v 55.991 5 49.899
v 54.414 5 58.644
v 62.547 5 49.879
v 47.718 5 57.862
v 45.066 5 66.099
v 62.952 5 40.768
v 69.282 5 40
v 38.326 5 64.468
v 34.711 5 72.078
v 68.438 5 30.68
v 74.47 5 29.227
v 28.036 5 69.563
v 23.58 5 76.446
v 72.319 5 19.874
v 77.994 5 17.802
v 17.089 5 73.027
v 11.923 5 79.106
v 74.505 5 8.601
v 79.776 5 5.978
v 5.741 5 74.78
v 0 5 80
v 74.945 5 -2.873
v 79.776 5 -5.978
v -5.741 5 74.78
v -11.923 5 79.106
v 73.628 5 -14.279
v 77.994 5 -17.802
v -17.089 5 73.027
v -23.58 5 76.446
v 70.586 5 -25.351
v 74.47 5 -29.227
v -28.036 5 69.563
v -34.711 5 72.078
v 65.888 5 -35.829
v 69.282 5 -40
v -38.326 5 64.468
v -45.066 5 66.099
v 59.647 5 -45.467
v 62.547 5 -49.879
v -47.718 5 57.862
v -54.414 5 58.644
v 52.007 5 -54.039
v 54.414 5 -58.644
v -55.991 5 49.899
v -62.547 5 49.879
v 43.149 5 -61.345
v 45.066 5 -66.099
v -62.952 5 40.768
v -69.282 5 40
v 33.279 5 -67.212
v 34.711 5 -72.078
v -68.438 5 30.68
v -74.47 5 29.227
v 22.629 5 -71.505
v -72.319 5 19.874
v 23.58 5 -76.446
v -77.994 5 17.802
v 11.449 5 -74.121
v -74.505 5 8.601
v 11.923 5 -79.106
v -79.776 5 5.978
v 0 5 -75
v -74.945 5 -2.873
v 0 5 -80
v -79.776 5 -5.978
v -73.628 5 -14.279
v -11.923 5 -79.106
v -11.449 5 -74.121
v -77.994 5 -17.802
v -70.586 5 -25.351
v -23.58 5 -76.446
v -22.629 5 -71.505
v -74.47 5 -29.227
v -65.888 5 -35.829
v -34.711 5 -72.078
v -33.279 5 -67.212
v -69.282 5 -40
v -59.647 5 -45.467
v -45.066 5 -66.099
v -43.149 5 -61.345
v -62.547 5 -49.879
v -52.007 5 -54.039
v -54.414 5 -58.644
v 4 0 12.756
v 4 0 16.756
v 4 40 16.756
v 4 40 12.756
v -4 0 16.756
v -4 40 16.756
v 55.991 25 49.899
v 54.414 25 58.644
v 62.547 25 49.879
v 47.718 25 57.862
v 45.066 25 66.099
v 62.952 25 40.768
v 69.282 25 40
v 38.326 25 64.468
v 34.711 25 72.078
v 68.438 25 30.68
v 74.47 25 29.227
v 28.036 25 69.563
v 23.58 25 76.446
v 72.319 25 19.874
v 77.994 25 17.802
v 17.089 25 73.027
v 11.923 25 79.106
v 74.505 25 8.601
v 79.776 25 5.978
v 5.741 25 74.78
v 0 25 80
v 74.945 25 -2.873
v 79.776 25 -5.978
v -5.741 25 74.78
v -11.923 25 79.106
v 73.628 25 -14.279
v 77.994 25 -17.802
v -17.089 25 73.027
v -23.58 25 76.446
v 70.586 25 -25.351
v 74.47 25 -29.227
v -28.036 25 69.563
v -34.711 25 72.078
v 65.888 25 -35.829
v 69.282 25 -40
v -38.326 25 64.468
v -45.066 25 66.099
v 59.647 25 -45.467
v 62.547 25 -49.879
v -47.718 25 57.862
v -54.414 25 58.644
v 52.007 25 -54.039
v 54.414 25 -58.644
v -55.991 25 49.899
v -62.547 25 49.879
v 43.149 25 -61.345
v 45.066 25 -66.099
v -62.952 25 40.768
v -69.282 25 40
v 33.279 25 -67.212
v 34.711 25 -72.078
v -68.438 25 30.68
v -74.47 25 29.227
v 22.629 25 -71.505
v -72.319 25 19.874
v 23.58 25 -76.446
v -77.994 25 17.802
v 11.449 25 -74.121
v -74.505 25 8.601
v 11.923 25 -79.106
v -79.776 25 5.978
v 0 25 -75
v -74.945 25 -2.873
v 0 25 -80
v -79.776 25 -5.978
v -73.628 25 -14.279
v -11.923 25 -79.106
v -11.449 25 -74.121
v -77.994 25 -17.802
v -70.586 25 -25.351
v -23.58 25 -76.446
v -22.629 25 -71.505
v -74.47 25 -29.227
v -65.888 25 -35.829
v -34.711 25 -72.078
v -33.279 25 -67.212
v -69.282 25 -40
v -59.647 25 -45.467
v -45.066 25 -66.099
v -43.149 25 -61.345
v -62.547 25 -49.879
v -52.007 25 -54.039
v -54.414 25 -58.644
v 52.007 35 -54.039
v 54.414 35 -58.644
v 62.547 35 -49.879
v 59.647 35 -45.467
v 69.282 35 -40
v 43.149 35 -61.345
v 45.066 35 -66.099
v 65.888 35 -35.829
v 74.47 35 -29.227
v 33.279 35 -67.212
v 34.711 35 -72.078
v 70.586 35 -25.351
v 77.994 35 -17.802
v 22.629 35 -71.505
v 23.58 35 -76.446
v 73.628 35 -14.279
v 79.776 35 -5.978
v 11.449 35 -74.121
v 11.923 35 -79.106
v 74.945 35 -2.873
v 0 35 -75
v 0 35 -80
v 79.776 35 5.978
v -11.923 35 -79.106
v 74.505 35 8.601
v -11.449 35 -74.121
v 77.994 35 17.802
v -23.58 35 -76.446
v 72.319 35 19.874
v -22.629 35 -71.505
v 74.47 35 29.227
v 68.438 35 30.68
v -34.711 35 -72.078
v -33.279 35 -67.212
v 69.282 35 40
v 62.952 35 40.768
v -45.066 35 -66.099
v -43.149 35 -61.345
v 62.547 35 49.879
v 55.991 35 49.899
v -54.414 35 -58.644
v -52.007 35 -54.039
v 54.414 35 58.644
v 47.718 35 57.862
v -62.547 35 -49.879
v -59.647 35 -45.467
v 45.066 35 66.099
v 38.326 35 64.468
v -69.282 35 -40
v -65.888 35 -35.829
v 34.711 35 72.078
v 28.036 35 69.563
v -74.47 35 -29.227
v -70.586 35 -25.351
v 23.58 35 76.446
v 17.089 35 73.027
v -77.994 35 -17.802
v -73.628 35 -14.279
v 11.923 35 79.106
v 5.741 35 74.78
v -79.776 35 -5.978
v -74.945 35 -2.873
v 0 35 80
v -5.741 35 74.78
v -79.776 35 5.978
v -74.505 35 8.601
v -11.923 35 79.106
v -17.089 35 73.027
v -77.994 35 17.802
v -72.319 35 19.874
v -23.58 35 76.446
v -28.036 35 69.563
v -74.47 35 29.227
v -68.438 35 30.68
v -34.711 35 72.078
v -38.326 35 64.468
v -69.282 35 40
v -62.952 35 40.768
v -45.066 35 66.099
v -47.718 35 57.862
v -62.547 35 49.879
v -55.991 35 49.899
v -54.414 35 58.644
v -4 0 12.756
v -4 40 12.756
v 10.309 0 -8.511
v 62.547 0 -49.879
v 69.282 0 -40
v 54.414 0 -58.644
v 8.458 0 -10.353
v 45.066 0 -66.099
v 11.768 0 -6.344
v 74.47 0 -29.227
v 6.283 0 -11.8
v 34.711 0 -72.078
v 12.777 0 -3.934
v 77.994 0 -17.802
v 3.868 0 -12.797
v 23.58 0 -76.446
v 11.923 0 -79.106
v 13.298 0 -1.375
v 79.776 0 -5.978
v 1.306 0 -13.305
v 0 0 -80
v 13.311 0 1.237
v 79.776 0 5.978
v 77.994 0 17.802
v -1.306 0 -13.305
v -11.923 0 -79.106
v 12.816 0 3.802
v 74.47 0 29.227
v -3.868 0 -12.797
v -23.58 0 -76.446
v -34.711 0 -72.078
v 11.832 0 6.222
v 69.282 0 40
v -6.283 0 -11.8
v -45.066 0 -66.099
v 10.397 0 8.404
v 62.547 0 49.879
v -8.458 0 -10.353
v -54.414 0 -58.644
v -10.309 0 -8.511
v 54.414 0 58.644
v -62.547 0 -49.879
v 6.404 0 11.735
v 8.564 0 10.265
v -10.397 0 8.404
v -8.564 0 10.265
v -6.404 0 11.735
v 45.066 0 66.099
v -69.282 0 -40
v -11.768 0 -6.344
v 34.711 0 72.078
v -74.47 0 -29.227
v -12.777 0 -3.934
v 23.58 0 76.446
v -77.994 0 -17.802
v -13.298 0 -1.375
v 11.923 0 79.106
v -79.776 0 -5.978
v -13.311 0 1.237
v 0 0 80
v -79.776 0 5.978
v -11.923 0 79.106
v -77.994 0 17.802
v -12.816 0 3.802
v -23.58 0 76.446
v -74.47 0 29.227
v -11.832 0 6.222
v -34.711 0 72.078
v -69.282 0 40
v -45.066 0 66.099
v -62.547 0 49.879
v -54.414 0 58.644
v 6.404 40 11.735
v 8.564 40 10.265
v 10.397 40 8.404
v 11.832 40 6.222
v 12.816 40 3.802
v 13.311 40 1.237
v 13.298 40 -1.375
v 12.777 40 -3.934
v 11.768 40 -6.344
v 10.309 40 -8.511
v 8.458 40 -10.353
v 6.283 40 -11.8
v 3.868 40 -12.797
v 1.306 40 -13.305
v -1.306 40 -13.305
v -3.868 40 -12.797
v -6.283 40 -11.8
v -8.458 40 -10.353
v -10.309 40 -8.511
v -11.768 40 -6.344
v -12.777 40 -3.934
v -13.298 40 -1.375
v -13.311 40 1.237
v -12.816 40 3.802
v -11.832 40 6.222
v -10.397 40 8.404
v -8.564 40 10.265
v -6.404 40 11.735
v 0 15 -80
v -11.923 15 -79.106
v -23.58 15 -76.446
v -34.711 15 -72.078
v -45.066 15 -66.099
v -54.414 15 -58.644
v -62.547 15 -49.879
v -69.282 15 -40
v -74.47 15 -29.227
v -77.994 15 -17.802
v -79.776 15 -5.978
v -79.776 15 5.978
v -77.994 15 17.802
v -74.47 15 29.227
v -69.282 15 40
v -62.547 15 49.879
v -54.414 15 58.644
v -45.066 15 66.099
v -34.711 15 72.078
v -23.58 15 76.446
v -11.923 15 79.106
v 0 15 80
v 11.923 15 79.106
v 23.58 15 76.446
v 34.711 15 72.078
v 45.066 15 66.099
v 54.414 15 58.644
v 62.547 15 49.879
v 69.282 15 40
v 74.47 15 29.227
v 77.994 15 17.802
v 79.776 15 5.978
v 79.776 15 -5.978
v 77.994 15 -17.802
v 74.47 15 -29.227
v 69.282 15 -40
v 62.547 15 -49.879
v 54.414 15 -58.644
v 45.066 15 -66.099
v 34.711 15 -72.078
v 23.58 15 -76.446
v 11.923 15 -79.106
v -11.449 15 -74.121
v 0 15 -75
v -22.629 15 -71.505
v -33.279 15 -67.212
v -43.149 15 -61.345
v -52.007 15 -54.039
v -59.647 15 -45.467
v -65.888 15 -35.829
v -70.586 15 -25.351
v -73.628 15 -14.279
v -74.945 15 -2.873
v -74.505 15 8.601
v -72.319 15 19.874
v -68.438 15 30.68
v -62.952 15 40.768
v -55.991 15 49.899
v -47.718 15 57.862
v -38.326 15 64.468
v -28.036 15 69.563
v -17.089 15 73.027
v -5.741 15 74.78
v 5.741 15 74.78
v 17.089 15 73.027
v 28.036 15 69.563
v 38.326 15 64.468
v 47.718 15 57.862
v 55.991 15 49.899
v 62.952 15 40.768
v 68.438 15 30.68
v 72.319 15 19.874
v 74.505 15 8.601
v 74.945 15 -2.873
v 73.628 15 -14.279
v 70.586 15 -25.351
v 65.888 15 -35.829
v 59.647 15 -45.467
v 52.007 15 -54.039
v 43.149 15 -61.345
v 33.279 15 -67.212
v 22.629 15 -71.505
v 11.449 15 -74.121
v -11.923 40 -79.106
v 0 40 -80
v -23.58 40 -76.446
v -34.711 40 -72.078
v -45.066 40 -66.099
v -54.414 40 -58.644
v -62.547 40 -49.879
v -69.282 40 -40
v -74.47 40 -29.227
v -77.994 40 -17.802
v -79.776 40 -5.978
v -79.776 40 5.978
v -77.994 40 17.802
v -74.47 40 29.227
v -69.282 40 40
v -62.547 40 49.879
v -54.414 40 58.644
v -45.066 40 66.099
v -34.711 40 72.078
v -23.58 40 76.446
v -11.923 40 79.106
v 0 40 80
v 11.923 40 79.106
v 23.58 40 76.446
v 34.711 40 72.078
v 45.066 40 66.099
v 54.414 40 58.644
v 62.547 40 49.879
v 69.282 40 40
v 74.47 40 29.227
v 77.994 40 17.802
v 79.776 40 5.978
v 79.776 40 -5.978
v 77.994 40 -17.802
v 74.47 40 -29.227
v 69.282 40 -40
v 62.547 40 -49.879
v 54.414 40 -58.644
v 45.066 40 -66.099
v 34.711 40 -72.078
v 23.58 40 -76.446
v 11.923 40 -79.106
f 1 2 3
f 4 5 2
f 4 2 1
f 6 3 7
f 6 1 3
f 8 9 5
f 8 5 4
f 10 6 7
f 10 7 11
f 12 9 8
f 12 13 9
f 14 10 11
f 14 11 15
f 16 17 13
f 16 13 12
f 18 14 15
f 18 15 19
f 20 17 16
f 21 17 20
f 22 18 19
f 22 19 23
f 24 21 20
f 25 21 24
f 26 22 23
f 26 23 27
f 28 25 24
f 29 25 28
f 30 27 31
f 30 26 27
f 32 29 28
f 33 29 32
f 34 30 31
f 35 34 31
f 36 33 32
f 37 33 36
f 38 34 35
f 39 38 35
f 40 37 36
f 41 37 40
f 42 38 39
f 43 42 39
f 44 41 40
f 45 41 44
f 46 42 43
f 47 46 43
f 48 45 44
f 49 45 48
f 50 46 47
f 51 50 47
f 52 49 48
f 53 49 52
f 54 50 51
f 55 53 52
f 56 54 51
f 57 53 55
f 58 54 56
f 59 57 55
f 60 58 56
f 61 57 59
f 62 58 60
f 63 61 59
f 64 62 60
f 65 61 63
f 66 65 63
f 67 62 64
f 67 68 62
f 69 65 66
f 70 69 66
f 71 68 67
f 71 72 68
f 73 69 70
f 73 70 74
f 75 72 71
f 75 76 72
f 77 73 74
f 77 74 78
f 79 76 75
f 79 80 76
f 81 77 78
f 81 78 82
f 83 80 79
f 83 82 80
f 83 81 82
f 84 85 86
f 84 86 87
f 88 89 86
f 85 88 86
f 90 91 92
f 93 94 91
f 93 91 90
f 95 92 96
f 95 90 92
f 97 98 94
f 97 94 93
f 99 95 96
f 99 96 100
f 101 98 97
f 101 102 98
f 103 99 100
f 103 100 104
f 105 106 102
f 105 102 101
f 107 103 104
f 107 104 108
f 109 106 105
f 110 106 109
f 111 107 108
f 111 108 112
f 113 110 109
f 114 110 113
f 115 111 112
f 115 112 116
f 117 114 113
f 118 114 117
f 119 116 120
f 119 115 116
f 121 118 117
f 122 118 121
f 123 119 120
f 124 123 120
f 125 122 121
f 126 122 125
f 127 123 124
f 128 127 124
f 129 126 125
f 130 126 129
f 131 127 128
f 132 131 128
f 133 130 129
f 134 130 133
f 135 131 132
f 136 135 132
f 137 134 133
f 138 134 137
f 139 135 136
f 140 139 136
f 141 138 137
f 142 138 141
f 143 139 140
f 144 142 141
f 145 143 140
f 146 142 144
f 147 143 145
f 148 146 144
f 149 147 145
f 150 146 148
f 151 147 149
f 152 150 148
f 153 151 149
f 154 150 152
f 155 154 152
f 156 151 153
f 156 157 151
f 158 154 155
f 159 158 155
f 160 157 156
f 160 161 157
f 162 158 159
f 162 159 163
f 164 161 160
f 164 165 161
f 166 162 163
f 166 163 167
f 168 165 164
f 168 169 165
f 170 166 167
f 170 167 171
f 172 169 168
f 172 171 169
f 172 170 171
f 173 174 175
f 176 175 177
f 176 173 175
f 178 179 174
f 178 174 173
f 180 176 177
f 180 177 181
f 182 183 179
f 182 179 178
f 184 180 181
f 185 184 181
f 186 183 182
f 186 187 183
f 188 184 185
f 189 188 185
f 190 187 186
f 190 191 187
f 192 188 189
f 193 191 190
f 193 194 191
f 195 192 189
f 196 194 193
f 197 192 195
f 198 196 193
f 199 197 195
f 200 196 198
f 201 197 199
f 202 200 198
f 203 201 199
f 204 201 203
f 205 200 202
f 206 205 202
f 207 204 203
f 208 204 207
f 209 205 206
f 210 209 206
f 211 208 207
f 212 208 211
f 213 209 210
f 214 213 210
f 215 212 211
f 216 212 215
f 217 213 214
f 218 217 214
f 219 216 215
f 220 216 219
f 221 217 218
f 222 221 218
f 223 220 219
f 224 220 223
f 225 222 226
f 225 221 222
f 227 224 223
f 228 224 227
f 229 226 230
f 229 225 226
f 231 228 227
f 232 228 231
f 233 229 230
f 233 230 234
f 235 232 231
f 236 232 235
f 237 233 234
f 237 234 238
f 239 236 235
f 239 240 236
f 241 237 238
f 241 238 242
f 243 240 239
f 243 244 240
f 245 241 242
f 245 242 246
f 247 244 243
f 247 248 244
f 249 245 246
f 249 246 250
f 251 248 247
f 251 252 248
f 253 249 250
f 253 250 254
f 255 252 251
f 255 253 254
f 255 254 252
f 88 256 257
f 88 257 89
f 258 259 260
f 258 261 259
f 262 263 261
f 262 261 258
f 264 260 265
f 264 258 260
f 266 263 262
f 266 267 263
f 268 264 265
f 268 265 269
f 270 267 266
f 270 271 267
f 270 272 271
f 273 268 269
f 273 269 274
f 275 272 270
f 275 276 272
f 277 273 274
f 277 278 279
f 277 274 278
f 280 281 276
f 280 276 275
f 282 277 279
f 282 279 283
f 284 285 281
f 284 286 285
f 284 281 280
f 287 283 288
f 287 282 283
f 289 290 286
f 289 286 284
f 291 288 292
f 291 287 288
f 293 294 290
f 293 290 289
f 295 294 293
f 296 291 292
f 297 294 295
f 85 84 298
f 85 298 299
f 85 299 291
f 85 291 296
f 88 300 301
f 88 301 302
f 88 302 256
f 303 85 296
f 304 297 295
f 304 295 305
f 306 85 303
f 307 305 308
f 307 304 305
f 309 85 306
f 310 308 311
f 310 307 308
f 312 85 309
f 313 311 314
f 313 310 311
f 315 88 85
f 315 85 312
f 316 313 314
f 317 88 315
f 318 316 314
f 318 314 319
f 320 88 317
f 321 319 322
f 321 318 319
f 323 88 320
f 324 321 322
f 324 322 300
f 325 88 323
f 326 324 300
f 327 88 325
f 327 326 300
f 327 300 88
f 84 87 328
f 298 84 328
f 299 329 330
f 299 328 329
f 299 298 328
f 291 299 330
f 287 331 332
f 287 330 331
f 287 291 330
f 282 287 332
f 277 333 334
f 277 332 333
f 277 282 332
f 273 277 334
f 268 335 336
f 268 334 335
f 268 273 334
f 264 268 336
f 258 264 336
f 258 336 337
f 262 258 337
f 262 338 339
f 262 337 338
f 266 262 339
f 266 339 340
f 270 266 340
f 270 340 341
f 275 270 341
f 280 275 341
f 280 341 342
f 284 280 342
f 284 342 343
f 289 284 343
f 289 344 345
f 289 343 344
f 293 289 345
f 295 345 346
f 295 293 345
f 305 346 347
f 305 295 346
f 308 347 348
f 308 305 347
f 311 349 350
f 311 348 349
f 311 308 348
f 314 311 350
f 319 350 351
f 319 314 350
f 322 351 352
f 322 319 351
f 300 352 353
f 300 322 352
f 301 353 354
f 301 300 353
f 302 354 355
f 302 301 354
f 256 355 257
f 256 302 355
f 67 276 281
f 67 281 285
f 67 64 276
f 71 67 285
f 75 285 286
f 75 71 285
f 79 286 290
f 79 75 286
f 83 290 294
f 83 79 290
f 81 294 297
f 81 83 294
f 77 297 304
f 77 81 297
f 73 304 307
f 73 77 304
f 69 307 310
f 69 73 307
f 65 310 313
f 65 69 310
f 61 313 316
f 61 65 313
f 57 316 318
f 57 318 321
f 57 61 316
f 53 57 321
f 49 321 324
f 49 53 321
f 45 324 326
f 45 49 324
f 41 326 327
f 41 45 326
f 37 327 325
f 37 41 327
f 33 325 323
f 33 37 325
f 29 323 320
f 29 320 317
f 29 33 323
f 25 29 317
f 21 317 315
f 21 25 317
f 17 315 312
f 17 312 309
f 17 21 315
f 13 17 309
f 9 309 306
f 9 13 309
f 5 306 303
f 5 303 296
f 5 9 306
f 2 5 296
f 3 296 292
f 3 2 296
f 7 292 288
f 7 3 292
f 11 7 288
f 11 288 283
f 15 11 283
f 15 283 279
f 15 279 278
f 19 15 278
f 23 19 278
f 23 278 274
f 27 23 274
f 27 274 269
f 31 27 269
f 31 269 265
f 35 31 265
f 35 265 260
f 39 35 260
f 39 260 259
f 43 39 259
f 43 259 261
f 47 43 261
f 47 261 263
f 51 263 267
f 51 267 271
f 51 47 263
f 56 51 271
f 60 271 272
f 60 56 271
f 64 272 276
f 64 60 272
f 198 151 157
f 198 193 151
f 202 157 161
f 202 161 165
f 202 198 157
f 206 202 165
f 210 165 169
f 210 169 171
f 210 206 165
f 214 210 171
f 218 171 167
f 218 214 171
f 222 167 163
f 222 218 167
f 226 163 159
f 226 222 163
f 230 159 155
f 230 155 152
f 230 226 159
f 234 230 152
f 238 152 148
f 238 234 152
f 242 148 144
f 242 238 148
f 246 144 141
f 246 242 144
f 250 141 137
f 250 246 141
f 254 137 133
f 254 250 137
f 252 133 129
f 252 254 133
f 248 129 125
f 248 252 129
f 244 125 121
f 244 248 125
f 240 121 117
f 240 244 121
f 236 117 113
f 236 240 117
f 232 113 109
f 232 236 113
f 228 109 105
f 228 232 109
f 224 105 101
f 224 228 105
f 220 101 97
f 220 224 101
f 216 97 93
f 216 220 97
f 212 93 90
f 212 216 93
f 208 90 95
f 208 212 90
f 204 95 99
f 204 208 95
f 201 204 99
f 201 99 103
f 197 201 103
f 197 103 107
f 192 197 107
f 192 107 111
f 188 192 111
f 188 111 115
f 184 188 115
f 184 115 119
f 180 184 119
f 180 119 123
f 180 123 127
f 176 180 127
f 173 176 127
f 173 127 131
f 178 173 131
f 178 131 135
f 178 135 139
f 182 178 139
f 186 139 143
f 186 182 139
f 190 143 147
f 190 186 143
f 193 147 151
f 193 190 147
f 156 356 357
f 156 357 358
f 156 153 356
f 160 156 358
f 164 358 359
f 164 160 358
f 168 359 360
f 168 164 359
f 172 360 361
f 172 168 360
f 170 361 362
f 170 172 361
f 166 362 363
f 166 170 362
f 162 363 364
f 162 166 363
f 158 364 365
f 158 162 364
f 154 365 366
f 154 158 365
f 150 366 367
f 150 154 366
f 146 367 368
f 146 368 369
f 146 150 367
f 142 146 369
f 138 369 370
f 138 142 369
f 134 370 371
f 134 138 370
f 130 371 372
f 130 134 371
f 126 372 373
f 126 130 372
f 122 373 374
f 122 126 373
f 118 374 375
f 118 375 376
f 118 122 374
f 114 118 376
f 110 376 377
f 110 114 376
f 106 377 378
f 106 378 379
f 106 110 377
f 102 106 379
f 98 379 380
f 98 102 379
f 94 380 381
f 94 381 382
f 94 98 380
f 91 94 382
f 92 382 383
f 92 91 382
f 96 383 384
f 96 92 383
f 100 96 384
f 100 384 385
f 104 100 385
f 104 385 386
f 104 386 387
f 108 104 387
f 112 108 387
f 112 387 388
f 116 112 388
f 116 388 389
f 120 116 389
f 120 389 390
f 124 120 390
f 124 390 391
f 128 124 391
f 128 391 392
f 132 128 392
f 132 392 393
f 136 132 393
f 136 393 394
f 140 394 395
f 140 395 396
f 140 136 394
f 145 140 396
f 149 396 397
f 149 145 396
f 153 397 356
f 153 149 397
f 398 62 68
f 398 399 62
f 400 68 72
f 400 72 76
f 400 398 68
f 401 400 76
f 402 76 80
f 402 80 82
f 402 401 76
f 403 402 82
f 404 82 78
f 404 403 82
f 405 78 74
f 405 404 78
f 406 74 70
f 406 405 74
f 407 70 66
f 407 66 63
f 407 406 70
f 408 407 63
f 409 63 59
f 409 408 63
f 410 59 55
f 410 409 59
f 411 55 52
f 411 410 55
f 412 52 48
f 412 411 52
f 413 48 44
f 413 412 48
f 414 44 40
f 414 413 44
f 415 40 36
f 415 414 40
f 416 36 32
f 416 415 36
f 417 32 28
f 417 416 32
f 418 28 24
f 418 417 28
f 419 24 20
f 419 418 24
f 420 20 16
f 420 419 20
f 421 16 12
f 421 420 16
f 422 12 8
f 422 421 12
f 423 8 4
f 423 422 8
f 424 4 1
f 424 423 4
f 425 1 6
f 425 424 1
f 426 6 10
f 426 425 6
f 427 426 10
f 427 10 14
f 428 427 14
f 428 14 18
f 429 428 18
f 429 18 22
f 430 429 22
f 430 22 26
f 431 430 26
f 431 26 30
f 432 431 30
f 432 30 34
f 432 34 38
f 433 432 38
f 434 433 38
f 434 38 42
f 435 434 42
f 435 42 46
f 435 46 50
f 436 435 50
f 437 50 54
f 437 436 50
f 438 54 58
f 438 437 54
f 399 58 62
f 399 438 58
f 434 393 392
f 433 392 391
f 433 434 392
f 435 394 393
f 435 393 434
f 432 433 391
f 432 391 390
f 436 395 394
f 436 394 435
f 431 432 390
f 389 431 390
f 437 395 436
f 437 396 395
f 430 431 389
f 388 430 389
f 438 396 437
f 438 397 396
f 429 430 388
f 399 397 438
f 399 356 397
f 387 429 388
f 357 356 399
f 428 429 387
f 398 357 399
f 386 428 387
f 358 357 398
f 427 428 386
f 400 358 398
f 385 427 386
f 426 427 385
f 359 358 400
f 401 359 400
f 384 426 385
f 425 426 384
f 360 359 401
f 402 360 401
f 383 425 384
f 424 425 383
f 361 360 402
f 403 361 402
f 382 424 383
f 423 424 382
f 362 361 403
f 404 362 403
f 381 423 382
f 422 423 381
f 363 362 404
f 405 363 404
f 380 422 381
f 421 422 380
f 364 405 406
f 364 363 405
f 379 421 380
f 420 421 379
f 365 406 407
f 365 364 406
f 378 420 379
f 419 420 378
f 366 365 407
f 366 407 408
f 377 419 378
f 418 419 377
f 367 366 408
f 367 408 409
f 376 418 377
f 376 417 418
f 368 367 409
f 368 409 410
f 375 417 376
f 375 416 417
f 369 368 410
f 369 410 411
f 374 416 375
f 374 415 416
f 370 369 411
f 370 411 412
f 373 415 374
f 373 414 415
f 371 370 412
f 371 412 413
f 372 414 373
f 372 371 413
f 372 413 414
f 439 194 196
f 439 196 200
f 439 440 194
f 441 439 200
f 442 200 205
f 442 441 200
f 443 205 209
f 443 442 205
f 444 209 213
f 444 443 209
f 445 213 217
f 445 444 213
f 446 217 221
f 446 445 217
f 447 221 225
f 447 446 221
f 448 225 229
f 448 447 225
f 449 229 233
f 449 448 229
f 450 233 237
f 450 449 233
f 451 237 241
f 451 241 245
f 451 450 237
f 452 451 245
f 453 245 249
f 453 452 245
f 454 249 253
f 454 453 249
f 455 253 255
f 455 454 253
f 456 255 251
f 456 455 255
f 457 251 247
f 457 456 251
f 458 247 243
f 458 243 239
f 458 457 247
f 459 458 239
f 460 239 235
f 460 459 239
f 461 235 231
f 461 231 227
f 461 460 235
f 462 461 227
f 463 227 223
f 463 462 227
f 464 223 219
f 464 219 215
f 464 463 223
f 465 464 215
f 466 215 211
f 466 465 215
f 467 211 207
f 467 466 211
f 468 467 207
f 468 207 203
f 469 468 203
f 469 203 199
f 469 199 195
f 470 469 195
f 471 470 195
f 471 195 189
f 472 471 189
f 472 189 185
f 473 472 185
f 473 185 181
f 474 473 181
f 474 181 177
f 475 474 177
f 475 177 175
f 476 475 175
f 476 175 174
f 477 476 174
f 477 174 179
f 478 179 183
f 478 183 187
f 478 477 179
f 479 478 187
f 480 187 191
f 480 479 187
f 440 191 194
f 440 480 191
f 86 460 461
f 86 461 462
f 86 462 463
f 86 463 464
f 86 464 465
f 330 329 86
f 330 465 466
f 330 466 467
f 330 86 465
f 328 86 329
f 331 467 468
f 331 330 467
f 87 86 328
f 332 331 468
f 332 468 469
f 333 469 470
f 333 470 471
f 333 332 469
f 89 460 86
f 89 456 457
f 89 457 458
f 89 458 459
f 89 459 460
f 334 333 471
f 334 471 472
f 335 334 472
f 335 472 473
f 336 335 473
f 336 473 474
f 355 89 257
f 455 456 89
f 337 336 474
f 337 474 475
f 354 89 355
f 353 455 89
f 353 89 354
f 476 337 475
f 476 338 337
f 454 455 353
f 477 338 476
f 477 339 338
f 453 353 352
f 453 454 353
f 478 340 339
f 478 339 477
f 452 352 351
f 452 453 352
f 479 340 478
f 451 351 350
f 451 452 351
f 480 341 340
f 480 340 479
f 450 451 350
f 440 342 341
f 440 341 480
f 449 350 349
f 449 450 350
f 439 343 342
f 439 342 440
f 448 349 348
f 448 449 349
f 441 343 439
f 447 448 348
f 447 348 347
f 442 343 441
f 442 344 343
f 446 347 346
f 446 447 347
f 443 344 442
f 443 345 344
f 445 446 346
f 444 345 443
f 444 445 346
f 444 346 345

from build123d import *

# Parameters (mm, degrees)
CUT_EXTRUDE1_DEPTH = 121


with BuildPart() as part:
    # Sketch1 → Revolve1 (revolve)
    with BuildSketch(Plane(origin=(0, 0, 0), x_dir=(0, 0, -1), z_dir=(1, 0, 0))):
        Polygon((10, 0), (80, 0), (80, 5), (75, 5), (75, 15), (80, 15), (80, 25), (75, 25), (75, 35), (80, 35), (80, 40), (10, 40), align=None)
    revolve(axis=Axis((0, 0, 0), (0, 1, 0)))

    # Sketch2 → Cut-Extrude1 (cut, through all)
    with BuildSketch(Plane.XZ):
        with BuildLine():
            Line((-4, 16.756133146), (4, 16.756133146))
            Line((4, 16.756133146), (4, 12.756133146))
            ThreePointArc((4, 12.756133146), (0, -13.36858006), (-4, 12.756133146))
            Line((-4, 12.756133146), (-4, 16.756133146))
        make_face()
    extrude(amount=-CUT_EXTRUDE1_DEPTH, mode=Mode.SUBTRACT)


solid = part.part
